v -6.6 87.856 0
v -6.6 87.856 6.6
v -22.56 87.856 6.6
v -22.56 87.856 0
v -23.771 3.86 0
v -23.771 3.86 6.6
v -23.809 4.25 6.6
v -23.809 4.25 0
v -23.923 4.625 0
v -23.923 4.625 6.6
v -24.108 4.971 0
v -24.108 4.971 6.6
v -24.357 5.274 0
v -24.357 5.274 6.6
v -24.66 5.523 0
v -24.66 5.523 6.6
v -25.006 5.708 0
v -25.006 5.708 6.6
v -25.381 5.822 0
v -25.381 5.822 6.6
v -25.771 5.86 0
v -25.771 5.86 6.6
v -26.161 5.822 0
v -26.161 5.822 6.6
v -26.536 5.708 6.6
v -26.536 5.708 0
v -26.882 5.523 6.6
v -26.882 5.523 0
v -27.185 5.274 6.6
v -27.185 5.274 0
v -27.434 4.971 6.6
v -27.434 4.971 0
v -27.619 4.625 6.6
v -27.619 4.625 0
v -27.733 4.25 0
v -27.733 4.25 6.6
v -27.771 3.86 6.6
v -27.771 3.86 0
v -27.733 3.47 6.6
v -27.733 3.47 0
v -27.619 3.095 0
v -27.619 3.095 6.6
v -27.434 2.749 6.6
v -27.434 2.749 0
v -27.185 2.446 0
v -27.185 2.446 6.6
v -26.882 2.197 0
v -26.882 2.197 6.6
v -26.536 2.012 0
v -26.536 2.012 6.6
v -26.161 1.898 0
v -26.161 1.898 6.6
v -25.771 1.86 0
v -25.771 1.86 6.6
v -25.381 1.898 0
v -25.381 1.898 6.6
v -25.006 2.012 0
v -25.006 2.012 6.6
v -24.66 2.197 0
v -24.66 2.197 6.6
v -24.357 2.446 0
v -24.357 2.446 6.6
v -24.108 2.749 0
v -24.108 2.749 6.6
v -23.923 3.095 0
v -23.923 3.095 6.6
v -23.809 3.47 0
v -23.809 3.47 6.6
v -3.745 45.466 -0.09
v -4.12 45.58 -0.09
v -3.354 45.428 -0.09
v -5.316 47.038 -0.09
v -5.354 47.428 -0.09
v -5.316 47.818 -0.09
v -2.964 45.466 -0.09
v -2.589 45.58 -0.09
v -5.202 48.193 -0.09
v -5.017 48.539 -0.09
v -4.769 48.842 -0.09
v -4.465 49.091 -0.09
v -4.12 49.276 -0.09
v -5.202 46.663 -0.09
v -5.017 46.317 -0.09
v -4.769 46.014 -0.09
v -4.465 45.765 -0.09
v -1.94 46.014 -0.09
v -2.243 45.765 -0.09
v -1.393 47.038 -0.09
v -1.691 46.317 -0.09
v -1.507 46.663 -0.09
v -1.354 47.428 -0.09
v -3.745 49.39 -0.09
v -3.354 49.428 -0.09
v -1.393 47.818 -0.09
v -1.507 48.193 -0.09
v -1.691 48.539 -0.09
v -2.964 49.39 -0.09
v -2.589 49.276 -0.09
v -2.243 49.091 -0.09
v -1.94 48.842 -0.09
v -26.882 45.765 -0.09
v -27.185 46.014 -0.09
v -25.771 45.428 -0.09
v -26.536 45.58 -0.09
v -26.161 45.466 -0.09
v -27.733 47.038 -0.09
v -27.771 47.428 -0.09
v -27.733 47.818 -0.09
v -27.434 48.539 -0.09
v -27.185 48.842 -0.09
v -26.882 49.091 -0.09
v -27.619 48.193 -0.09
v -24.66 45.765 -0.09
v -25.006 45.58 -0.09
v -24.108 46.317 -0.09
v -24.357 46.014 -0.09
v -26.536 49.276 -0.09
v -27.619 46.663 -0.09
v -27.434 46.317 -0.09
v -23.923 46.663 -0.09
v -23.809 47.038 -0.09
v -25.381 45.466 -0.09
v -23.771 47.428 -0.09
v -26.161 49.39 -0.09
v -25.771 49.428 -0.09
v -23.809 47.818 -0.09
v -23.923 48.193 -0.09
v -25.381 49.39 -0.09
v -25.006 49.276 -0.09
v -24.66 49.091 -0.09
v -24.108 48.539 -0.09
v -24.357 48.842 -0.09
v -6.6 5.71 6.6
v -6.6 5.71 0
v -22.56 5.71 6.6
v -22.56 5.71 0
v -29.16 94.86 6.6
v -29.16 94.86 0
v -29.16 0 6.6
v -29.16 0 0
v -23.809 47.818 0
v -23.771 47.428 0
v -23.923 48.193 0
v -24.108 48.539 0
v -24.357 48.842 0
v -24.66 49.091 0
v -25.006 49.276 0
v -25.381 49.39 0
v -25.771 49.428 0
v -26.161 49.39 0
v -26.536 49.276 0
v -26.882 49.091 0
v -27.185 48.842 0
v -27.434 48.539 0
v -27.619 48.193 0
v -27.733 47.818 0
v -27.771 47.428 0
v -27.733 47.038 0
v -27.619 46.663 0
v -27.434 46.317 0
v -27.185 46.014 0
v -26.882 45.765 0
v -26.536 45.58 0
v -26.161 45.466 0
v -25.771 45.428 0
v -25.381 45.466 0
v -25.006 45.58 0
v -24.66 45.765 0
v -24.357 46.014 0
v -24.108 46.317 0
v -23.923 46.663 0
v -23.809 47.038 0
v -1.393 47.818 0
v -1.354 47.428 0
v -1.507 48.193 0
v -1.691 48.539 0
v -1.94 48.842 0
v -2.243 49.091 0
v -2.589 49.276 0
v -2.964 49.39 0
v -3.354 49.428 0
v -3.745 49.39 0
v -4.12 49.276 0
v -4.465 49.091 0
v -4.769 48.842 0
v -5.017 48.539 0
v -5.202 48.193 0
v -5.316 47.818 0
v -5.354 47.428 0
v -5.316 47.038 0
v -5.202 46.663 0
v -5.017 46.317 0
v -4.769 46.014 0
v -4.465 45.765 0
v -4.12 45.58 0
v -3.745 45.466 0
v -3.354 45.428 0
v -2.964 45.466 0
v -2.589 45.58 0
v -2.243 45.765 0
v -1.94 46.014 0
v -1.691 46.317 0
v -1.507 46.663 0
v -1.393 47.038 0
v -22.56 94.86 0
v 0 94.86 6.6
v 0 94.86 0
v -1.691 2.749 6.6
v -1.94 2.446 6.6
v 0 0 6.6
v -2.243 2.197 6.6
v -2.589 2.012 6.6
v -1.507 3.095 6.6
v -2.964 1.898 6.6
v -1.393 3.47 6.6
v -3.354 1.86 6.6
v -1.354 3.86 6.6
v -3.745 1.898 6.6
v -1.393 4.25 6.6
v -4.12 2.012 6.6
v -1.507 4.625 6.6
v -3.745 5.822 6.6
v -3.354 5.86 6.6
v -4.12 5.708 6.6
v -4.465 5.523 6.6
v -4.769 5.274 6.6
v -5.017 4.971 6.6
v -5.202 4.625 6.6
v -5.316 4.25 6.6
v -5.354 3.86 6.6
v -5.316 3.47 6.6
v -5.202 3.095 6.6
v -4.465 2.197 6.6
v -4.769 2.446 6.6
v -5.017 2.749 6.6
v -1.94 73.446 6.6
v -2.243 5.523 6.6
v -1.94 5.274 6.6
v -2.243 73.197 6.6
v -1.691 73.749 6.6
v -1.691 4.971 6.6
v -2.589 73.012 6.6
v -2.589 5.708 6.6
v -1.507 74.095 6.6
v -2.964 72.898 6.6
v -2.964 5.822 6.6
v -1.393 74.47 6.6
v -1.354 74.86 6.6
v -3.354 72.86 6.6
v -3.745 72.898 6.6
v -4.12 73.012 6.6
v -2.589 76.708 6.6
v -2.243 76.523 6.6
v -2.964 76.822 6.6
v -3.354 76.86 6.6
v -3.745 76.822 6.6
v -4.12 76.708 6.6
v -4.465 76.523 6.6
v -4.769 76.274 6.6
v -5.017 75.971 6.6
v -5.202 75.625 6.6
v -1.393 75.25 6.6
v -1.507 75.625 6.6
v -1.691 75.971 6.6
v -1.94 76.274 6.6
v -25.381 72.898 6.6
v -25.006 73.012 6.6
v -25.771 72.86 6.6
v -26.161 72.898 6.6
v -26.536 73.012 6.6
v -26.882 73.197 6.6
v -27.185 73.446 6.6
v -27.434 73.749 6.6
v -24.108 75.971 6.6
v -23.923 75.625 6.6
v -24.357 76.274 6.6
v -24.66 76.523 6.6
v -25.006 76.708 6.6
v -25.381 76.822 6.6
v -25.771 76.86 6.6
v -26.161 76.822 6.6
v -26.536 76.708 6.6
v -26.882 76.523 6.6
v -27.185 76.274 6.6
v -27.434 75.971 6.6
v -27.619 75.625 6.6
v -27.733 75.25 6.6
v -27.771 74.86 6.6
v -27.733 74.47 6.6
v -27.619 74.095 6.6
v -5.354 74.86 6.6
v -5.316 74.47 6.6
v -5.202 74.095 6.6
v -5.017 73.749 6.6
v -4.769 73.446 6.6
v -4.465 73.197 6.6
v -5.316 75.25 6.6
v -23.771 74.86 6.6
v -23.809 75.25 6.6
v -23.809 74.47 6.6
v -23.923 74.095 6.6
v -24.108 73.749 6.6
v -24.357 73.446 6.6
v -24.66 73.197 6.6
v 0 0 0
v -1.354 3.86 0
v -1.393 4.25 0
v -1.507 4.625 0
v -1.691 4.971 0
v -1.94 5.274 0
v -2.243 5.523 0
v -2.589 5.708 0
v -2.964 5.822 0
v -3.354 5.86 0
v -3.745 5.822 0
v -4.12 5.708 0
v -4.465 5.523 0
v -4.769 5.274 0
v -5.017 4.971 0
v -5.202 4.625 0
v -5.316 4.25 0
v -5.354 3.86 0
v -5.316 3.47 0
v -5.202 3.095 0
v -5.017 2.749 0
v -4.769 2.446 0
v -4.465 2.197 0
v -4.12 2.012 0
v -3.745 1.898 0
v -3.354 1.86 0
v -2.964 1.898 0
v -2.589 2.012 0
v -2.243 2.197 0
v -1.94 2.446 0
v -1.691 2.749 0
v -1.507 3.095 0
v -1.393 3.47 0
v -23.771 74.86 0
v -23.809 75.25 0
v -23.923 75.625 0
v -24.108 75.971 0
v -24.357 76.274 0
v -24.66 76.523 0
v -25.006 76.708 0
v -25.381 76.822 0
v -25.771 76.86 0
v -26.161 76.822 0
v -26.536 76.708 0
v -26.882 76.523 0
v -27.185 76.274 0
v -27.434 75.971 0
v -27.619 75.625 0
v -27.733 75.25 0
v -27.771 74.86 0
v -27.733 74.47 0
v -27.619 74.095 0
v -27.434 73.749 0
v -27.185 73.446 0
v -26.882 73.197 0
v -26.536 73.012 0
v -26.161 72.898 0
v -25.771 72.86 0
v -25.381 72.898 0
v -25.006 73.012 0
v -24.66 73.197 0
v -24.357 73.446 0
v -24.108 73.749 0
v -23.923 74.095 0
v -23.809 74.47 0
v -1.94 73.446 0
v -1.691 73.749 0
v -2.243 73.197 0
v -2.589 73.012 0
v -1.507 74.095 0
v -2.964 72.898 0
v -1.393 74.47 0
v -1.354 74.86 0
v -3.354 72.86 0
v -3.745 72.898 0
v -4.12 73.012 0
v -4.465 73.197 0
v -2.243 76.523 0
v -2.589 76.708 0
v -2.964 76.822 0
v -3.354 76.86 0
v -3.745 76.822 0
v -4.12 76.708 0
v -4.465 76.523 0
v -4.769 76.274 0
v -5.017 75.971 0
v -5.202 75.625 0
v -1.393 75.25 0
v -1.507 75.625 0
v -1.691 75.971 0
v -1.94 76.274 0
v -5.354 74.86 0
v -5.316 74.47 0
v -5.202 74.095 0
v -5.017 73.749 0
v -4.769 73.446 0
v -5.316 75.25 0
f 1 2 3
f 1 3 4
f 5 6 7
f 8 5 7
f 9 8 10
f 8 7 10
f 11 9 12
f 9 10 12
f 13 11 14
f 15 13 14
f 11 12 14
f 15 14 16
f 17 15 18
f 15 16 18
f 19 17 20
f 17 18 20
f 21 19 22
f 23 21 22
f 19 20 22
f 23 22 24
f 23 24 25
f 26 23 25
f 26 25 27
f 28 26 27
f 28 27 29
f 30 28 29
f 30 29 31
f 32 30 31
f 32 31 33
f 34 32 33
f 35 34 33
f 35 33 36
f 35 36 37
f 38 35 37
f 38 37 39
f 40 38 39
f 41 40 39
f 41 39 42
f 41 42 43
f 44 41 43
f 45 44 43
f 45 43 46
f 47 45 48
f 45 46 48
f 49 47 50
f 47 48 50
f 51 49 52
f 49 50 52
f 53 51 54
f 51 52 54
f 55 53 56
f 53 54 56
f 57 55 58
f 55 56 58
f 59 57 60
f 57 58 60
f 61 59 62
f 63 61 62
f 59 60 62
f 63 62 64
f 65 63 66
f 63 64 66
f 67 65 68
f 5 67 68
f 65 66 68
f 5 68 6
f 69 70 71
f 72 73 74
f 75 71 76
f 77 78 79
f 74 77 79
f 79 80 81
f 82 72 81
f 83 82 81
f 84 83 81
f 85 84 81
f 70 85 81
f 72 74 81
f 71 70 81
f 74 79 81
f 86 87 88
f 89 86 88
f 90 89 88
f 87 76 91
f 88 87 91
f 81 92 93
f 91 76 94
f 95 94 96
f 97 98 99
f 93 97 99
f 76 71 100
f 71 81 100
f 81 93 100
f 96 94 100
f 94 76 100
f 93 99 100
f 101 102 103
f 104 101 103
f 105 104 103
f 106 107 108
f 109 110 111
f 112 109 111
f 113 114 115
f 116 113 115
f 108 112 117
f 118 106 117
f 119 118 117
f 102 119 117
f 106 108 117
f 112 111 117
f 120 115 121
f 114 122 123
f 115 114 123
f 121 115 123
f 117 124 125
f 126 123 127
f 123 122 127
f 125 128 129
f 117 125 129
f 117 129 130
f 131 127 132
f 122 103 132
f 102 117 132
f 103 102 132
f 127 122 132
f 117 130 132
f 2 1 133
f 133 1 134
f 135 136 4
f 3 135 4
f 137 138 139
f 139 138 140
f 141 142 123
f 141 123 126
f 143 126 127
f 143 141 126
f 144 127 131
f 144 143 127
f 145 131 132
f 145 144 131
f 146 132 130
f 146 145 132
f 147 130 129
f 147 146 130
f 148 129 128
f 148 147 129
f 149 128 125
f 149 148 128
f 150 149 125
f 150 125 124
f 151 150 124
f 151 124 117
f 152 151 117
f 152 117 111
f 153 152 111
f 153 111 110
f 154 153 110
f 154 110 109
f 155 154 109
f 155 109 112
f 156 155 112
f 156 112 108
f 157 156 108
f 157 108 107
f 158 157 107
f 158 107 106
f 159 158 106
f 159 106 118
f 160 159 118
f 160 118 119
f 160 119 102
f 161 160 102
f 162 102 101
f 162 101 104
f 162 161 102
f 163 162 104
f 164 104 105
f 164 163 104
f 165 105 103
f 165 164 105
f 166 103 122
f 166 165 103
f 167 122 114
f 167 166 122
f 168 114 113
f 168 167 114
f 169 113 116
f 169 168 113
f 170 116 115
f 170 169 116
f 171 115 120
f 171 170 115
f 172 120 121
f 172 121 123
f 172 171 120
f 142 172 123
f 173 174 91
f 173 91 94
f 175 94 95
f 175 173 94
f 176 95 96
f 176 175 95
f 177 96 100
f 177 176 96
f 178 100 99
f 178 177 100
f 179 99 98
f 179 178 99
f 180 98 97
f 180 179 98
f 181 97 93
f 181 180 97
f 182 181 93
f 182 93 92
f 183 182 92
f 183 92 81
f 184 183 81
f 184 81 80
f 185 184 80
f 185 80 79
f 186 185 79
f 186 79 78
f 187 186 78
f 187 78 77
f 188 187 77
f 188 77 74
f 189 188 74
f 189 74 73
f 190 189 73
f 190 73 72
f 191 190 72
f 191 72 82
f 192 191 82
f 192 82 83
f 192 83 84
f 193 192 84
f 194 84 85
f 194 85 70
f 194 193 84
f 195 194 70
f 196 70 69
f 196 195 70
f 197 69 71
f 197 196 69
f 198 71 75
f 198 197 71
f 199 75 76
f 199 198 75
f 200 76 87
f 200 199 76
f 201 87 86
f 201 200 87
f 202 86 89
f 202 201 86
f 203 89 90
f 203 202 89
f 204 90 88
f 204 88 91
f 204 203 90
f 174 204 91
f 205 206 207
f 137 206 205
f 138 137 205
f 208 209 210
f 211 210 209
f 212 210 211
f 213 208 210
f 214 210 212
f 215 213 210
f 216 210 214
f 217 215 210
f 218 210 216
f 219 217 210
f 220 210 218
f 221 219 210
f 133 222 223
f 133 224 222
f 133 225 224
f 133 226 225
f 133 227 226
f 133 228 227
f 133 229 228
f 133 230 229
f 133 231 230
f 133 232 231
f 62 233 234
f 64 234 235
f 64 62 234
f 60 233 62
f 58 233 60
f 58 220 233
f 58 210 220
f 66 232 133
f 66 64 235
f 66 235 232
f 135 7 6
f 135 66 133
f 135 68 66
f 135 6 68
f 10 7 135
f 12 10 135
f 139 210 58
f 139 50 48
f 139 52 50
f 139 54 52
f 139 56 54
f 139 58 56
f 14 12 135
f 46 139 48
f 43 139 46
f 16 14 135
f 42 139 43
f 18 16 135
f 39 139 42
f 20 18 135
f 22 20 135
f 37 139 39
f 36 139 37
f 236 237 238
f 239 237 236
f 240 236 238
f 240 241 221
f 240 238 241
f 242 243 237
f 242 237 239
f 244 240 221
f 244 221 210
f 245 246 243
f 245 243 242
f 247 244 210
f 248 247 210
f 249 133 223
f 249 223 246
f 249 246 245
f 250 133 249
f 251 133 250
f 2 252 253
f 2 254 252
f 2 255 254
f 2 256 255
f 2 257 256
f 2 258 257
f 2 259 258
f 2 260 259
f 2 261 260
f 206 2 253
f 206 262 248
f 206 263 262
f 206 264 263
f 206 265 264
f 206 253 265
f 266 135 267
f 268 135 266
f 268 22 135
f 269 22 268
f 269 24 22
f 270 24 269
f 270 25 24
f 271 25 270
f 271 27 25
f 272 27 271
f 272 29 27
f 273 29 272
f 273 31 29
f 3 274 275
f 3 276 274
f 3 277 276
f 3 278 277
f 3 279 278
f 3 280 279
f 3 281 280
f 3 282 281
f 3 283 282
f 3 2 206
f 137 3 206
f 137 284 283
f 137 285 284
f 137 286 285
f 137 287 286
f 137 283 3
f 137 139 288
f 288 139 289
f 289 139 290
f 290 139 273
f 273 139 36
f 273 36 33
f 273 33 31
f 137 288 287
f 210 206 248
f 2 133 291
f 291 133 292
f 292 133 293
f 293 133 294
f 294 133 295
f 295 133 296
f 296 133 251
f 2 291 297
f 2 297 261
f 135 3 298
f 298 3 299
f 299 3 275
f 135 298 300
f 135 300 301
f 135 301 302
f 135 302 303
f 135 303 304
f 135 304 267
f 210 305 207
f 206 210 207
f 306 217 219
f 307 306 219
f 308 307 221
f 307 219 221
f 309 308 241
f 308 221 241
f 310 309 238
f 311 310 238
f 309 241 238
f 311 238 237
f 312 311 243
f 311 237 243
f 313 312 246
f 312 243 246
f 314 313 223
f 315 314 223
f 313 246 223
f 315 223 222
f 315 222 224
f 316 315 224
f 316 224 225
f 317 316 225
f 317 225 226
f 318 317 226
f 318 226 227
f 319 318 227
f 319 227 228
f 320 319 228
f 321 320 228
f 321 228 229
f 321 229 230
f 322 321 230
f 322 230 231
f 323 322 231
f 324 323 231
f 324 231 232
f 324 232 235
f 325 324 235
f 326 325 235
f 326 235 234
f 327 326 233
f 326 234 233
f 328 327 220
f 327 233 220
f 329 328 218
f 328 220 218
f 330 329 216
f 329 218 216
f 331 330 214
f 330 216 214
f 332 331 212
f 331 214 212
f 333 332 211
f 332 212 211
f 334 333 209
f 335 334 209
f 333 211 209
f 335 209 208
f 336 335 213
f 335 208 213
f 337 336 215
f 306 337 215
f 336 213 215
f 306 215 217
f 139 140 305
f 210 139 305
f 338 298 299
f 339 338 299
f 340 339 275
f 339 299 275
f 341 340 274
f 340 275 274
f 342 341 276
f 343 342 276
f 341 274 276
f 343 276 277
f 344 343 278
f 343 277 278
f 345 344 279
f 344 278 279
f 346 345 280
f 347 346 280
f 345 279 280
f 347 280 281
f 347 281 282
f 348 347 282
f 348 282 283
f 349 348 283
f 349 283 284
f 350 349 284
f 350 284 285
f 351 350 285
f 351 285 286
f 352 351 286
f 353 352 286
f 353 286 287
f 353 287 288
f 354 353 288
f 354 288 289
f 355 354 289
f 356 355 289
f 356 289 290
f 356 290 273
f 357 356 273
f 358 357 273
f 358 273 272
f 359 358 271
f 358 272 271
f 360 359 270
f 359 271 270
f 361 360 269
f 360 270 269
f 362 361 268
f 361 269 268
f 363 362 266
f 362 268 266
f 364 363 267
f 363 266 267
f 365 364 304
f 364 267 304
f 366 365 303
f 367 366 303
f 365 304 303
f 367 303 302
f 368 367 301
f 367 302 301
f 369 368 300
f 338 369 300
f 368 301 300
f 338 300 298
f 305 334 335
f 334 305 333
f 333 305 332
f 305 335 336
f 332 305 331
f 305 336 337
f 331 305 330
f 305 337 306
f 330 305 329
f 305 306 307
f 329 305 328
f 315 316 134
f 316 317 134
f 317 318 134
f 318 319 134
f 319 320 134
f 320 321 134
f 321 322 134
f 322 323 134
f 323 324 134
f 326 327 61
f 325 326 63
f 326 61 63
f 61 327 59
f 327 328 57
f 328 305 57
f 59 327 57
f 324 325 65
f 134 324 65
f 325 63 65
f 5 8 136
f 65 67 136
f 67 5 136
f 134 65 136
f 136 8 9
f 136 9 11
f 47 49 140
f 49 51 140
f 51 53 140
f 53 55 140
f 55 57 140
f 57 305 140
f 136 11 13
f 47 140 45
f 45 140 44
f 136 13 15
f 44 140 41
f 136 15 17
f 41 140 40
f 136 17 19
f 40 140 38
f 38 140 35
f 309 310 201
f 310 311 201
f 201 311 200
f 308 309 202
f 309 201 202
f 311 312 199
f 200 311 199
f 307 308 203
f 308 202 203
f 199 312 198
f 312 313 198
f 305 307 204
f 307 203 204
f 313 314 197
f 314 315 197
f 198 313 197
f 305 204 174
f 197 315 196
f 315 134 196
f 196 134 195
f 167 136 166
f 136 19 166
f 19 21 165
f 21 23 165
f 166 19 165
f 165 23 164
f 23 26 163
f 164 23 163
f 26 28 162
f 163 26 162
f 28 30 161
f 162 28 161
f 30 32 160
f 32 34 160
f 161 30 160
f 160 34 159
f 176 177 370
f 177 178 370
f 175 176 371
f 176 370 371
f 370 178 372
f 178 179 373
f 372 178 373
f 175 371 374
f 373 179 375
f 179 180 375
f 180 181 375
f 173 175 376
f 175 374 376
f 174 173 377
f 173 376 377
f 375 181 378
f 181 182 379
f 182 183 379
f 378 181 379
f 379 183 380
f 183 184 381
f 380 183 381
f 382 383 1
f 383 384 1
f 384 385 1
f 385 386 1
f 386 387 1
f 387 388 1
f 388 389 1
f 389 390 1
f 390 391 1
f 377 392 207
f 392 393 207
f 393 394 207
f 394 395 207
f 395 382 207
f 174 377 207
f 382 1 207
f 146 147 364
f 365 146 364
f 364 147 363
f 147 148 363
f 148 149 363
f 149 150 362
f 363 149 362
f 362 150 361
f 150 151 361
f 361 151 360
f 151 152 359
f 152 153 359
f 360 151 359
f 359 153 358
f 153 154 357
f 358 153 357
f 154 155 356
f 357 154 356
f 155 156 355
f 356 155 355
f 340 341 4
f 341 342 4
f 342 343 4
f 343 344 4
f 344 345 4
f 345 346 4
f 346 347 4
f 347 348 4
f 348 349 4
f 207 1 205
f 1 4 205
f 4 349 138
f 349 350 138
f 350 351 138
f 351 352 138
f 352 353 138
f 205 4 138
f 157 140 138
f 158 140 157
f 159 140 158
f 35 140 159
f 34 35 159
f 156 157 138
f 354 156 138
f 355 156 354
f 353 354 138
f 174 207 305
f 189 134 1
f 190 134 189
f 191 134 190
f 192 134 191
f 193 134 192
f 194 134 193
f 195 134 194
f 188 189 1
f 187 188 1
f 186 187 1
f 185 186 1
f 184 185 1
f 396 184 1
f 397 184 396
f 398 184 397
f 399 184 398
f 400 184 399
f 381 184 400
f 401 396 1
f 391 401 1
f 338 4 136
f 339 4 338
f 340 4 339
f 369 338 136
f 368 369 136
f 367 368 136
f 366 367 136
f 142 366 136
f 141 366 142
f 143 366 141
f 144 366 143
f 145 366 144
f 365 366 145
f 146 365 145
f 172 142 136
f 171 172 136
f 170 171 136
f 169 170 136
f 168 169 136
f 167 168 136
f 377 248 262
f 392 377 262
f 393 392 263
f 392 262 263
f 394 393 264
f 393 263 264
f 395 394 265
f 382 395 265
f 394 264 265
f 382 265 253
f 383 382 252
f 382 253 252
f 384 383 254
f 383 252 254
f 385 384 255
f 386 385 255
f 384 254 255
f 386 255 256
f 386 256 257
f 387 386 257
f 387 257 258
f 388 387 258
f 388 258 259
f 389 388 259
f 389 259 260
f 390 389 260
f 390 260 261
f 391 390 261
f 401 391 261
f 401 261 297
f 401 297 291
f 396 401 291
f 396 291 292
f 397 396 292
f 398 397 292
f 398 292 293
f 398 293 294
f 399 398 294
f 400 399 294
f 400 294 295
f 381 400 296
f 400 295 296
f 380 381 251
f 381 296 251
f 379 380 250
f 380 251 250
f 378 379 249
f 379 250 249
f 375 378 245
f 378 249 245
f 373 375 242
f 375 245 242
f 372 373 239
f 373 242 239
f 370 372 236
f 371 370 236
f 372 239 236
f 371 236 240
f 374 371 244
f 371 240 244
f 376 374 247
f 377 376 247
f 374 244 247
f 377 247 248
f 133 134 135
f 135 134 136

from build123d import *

# Parameters (mm, degrees)
BOSS_EXTRUDE1_DEPTH = 6.6
BOSS_EXTRUDE2_REACH = 24.56
SKETCH3_W           = 6.6
SKETCH3_H           = 7.003924561
SKETCH4_R           = 2
CUT_EXTRUDE1_DEPTH  = 15
SKETCH5_R           = 2
BOSS_EXTRUDE3_DEPTH = 6.69


with BuildPart() as part:
    # Sketch2 → Boss-Extrude1 (new body)
    with BuildSketch(Plane.XY):
        Polygon((0, 0), (0, 94.86), (-6.6, 94.86), (-6.6, 5.71), (-22.56, 5.71), (-22.56, 94.86), (-29.16, 94.86), (-29.16, 0), align=None)
    extrude(amount=BOSS_EXTRUDE1_DEPTH)

    # Sketch3 → Boss-Extrude2 (add, up to next)
    with BuildSketch(Plane(origin=(-22.56, 0, 0), x_dir=(0, 0, -1), z_dir=(1, 0, 0)), mode=Mode.PRIVATE) as boss_extrude2_sk1:
        with Locations((-3.3, 91.35803772)):
            Rectangle(SKETCH3_W, SKETCH3_H)
    boss_extrude2_tool1 = extrude(boss_extrude2_sk1.sketch, amount=BOSS_EXTRUDE2_REACH, mode=Mode.PRIVATE) - part.part
    add(boss_extrude2_tool1.solids().sort_by_distance((-22.56, 91.358038, 3.3))[0])

    # Sketch4 → Cut-Extrude1 (cut)
    with BuildSketch(Plane.XY.offset(6.6)):
        with Locations((-3.354353393, 47.428062363)):
            Circle(SKETCH4_R)
        with Locations((-25.771024386, 47.428062363)):
            Circle(SKETCH4_R)
        with Locations((-25.771024386, 3.86)):
            Circle(SKETCH4_R)
        with Locations((-3.354353393, 3.86)):
            Circle(SKETCH4_R)
        with Locations((-25.771024386, 74.86)):
            Circle(SKETCH4_R)
        with Locations((-3.354353393, 74.86)):
            Circle(SKETCH4_R)
    extrude(amount=-CUT_EXTRUDE1_DEPTH, mode=Mode.SUBTRACT)

    # Sketch5 → Boss-Extrude3 (add)
    with BuildSketch(Plane.XY.offset(6.6)):
        with Locations((-25.771024386, 47.428062363)):
            Circle(SKETCH5_R)
        with Locations((-3.354353393, 47.428062363)):
            Circle(SKETCH5_R)
    extrude(amount=-BOSS_EXTRUDE3_DEPTH)


solid = part.part
